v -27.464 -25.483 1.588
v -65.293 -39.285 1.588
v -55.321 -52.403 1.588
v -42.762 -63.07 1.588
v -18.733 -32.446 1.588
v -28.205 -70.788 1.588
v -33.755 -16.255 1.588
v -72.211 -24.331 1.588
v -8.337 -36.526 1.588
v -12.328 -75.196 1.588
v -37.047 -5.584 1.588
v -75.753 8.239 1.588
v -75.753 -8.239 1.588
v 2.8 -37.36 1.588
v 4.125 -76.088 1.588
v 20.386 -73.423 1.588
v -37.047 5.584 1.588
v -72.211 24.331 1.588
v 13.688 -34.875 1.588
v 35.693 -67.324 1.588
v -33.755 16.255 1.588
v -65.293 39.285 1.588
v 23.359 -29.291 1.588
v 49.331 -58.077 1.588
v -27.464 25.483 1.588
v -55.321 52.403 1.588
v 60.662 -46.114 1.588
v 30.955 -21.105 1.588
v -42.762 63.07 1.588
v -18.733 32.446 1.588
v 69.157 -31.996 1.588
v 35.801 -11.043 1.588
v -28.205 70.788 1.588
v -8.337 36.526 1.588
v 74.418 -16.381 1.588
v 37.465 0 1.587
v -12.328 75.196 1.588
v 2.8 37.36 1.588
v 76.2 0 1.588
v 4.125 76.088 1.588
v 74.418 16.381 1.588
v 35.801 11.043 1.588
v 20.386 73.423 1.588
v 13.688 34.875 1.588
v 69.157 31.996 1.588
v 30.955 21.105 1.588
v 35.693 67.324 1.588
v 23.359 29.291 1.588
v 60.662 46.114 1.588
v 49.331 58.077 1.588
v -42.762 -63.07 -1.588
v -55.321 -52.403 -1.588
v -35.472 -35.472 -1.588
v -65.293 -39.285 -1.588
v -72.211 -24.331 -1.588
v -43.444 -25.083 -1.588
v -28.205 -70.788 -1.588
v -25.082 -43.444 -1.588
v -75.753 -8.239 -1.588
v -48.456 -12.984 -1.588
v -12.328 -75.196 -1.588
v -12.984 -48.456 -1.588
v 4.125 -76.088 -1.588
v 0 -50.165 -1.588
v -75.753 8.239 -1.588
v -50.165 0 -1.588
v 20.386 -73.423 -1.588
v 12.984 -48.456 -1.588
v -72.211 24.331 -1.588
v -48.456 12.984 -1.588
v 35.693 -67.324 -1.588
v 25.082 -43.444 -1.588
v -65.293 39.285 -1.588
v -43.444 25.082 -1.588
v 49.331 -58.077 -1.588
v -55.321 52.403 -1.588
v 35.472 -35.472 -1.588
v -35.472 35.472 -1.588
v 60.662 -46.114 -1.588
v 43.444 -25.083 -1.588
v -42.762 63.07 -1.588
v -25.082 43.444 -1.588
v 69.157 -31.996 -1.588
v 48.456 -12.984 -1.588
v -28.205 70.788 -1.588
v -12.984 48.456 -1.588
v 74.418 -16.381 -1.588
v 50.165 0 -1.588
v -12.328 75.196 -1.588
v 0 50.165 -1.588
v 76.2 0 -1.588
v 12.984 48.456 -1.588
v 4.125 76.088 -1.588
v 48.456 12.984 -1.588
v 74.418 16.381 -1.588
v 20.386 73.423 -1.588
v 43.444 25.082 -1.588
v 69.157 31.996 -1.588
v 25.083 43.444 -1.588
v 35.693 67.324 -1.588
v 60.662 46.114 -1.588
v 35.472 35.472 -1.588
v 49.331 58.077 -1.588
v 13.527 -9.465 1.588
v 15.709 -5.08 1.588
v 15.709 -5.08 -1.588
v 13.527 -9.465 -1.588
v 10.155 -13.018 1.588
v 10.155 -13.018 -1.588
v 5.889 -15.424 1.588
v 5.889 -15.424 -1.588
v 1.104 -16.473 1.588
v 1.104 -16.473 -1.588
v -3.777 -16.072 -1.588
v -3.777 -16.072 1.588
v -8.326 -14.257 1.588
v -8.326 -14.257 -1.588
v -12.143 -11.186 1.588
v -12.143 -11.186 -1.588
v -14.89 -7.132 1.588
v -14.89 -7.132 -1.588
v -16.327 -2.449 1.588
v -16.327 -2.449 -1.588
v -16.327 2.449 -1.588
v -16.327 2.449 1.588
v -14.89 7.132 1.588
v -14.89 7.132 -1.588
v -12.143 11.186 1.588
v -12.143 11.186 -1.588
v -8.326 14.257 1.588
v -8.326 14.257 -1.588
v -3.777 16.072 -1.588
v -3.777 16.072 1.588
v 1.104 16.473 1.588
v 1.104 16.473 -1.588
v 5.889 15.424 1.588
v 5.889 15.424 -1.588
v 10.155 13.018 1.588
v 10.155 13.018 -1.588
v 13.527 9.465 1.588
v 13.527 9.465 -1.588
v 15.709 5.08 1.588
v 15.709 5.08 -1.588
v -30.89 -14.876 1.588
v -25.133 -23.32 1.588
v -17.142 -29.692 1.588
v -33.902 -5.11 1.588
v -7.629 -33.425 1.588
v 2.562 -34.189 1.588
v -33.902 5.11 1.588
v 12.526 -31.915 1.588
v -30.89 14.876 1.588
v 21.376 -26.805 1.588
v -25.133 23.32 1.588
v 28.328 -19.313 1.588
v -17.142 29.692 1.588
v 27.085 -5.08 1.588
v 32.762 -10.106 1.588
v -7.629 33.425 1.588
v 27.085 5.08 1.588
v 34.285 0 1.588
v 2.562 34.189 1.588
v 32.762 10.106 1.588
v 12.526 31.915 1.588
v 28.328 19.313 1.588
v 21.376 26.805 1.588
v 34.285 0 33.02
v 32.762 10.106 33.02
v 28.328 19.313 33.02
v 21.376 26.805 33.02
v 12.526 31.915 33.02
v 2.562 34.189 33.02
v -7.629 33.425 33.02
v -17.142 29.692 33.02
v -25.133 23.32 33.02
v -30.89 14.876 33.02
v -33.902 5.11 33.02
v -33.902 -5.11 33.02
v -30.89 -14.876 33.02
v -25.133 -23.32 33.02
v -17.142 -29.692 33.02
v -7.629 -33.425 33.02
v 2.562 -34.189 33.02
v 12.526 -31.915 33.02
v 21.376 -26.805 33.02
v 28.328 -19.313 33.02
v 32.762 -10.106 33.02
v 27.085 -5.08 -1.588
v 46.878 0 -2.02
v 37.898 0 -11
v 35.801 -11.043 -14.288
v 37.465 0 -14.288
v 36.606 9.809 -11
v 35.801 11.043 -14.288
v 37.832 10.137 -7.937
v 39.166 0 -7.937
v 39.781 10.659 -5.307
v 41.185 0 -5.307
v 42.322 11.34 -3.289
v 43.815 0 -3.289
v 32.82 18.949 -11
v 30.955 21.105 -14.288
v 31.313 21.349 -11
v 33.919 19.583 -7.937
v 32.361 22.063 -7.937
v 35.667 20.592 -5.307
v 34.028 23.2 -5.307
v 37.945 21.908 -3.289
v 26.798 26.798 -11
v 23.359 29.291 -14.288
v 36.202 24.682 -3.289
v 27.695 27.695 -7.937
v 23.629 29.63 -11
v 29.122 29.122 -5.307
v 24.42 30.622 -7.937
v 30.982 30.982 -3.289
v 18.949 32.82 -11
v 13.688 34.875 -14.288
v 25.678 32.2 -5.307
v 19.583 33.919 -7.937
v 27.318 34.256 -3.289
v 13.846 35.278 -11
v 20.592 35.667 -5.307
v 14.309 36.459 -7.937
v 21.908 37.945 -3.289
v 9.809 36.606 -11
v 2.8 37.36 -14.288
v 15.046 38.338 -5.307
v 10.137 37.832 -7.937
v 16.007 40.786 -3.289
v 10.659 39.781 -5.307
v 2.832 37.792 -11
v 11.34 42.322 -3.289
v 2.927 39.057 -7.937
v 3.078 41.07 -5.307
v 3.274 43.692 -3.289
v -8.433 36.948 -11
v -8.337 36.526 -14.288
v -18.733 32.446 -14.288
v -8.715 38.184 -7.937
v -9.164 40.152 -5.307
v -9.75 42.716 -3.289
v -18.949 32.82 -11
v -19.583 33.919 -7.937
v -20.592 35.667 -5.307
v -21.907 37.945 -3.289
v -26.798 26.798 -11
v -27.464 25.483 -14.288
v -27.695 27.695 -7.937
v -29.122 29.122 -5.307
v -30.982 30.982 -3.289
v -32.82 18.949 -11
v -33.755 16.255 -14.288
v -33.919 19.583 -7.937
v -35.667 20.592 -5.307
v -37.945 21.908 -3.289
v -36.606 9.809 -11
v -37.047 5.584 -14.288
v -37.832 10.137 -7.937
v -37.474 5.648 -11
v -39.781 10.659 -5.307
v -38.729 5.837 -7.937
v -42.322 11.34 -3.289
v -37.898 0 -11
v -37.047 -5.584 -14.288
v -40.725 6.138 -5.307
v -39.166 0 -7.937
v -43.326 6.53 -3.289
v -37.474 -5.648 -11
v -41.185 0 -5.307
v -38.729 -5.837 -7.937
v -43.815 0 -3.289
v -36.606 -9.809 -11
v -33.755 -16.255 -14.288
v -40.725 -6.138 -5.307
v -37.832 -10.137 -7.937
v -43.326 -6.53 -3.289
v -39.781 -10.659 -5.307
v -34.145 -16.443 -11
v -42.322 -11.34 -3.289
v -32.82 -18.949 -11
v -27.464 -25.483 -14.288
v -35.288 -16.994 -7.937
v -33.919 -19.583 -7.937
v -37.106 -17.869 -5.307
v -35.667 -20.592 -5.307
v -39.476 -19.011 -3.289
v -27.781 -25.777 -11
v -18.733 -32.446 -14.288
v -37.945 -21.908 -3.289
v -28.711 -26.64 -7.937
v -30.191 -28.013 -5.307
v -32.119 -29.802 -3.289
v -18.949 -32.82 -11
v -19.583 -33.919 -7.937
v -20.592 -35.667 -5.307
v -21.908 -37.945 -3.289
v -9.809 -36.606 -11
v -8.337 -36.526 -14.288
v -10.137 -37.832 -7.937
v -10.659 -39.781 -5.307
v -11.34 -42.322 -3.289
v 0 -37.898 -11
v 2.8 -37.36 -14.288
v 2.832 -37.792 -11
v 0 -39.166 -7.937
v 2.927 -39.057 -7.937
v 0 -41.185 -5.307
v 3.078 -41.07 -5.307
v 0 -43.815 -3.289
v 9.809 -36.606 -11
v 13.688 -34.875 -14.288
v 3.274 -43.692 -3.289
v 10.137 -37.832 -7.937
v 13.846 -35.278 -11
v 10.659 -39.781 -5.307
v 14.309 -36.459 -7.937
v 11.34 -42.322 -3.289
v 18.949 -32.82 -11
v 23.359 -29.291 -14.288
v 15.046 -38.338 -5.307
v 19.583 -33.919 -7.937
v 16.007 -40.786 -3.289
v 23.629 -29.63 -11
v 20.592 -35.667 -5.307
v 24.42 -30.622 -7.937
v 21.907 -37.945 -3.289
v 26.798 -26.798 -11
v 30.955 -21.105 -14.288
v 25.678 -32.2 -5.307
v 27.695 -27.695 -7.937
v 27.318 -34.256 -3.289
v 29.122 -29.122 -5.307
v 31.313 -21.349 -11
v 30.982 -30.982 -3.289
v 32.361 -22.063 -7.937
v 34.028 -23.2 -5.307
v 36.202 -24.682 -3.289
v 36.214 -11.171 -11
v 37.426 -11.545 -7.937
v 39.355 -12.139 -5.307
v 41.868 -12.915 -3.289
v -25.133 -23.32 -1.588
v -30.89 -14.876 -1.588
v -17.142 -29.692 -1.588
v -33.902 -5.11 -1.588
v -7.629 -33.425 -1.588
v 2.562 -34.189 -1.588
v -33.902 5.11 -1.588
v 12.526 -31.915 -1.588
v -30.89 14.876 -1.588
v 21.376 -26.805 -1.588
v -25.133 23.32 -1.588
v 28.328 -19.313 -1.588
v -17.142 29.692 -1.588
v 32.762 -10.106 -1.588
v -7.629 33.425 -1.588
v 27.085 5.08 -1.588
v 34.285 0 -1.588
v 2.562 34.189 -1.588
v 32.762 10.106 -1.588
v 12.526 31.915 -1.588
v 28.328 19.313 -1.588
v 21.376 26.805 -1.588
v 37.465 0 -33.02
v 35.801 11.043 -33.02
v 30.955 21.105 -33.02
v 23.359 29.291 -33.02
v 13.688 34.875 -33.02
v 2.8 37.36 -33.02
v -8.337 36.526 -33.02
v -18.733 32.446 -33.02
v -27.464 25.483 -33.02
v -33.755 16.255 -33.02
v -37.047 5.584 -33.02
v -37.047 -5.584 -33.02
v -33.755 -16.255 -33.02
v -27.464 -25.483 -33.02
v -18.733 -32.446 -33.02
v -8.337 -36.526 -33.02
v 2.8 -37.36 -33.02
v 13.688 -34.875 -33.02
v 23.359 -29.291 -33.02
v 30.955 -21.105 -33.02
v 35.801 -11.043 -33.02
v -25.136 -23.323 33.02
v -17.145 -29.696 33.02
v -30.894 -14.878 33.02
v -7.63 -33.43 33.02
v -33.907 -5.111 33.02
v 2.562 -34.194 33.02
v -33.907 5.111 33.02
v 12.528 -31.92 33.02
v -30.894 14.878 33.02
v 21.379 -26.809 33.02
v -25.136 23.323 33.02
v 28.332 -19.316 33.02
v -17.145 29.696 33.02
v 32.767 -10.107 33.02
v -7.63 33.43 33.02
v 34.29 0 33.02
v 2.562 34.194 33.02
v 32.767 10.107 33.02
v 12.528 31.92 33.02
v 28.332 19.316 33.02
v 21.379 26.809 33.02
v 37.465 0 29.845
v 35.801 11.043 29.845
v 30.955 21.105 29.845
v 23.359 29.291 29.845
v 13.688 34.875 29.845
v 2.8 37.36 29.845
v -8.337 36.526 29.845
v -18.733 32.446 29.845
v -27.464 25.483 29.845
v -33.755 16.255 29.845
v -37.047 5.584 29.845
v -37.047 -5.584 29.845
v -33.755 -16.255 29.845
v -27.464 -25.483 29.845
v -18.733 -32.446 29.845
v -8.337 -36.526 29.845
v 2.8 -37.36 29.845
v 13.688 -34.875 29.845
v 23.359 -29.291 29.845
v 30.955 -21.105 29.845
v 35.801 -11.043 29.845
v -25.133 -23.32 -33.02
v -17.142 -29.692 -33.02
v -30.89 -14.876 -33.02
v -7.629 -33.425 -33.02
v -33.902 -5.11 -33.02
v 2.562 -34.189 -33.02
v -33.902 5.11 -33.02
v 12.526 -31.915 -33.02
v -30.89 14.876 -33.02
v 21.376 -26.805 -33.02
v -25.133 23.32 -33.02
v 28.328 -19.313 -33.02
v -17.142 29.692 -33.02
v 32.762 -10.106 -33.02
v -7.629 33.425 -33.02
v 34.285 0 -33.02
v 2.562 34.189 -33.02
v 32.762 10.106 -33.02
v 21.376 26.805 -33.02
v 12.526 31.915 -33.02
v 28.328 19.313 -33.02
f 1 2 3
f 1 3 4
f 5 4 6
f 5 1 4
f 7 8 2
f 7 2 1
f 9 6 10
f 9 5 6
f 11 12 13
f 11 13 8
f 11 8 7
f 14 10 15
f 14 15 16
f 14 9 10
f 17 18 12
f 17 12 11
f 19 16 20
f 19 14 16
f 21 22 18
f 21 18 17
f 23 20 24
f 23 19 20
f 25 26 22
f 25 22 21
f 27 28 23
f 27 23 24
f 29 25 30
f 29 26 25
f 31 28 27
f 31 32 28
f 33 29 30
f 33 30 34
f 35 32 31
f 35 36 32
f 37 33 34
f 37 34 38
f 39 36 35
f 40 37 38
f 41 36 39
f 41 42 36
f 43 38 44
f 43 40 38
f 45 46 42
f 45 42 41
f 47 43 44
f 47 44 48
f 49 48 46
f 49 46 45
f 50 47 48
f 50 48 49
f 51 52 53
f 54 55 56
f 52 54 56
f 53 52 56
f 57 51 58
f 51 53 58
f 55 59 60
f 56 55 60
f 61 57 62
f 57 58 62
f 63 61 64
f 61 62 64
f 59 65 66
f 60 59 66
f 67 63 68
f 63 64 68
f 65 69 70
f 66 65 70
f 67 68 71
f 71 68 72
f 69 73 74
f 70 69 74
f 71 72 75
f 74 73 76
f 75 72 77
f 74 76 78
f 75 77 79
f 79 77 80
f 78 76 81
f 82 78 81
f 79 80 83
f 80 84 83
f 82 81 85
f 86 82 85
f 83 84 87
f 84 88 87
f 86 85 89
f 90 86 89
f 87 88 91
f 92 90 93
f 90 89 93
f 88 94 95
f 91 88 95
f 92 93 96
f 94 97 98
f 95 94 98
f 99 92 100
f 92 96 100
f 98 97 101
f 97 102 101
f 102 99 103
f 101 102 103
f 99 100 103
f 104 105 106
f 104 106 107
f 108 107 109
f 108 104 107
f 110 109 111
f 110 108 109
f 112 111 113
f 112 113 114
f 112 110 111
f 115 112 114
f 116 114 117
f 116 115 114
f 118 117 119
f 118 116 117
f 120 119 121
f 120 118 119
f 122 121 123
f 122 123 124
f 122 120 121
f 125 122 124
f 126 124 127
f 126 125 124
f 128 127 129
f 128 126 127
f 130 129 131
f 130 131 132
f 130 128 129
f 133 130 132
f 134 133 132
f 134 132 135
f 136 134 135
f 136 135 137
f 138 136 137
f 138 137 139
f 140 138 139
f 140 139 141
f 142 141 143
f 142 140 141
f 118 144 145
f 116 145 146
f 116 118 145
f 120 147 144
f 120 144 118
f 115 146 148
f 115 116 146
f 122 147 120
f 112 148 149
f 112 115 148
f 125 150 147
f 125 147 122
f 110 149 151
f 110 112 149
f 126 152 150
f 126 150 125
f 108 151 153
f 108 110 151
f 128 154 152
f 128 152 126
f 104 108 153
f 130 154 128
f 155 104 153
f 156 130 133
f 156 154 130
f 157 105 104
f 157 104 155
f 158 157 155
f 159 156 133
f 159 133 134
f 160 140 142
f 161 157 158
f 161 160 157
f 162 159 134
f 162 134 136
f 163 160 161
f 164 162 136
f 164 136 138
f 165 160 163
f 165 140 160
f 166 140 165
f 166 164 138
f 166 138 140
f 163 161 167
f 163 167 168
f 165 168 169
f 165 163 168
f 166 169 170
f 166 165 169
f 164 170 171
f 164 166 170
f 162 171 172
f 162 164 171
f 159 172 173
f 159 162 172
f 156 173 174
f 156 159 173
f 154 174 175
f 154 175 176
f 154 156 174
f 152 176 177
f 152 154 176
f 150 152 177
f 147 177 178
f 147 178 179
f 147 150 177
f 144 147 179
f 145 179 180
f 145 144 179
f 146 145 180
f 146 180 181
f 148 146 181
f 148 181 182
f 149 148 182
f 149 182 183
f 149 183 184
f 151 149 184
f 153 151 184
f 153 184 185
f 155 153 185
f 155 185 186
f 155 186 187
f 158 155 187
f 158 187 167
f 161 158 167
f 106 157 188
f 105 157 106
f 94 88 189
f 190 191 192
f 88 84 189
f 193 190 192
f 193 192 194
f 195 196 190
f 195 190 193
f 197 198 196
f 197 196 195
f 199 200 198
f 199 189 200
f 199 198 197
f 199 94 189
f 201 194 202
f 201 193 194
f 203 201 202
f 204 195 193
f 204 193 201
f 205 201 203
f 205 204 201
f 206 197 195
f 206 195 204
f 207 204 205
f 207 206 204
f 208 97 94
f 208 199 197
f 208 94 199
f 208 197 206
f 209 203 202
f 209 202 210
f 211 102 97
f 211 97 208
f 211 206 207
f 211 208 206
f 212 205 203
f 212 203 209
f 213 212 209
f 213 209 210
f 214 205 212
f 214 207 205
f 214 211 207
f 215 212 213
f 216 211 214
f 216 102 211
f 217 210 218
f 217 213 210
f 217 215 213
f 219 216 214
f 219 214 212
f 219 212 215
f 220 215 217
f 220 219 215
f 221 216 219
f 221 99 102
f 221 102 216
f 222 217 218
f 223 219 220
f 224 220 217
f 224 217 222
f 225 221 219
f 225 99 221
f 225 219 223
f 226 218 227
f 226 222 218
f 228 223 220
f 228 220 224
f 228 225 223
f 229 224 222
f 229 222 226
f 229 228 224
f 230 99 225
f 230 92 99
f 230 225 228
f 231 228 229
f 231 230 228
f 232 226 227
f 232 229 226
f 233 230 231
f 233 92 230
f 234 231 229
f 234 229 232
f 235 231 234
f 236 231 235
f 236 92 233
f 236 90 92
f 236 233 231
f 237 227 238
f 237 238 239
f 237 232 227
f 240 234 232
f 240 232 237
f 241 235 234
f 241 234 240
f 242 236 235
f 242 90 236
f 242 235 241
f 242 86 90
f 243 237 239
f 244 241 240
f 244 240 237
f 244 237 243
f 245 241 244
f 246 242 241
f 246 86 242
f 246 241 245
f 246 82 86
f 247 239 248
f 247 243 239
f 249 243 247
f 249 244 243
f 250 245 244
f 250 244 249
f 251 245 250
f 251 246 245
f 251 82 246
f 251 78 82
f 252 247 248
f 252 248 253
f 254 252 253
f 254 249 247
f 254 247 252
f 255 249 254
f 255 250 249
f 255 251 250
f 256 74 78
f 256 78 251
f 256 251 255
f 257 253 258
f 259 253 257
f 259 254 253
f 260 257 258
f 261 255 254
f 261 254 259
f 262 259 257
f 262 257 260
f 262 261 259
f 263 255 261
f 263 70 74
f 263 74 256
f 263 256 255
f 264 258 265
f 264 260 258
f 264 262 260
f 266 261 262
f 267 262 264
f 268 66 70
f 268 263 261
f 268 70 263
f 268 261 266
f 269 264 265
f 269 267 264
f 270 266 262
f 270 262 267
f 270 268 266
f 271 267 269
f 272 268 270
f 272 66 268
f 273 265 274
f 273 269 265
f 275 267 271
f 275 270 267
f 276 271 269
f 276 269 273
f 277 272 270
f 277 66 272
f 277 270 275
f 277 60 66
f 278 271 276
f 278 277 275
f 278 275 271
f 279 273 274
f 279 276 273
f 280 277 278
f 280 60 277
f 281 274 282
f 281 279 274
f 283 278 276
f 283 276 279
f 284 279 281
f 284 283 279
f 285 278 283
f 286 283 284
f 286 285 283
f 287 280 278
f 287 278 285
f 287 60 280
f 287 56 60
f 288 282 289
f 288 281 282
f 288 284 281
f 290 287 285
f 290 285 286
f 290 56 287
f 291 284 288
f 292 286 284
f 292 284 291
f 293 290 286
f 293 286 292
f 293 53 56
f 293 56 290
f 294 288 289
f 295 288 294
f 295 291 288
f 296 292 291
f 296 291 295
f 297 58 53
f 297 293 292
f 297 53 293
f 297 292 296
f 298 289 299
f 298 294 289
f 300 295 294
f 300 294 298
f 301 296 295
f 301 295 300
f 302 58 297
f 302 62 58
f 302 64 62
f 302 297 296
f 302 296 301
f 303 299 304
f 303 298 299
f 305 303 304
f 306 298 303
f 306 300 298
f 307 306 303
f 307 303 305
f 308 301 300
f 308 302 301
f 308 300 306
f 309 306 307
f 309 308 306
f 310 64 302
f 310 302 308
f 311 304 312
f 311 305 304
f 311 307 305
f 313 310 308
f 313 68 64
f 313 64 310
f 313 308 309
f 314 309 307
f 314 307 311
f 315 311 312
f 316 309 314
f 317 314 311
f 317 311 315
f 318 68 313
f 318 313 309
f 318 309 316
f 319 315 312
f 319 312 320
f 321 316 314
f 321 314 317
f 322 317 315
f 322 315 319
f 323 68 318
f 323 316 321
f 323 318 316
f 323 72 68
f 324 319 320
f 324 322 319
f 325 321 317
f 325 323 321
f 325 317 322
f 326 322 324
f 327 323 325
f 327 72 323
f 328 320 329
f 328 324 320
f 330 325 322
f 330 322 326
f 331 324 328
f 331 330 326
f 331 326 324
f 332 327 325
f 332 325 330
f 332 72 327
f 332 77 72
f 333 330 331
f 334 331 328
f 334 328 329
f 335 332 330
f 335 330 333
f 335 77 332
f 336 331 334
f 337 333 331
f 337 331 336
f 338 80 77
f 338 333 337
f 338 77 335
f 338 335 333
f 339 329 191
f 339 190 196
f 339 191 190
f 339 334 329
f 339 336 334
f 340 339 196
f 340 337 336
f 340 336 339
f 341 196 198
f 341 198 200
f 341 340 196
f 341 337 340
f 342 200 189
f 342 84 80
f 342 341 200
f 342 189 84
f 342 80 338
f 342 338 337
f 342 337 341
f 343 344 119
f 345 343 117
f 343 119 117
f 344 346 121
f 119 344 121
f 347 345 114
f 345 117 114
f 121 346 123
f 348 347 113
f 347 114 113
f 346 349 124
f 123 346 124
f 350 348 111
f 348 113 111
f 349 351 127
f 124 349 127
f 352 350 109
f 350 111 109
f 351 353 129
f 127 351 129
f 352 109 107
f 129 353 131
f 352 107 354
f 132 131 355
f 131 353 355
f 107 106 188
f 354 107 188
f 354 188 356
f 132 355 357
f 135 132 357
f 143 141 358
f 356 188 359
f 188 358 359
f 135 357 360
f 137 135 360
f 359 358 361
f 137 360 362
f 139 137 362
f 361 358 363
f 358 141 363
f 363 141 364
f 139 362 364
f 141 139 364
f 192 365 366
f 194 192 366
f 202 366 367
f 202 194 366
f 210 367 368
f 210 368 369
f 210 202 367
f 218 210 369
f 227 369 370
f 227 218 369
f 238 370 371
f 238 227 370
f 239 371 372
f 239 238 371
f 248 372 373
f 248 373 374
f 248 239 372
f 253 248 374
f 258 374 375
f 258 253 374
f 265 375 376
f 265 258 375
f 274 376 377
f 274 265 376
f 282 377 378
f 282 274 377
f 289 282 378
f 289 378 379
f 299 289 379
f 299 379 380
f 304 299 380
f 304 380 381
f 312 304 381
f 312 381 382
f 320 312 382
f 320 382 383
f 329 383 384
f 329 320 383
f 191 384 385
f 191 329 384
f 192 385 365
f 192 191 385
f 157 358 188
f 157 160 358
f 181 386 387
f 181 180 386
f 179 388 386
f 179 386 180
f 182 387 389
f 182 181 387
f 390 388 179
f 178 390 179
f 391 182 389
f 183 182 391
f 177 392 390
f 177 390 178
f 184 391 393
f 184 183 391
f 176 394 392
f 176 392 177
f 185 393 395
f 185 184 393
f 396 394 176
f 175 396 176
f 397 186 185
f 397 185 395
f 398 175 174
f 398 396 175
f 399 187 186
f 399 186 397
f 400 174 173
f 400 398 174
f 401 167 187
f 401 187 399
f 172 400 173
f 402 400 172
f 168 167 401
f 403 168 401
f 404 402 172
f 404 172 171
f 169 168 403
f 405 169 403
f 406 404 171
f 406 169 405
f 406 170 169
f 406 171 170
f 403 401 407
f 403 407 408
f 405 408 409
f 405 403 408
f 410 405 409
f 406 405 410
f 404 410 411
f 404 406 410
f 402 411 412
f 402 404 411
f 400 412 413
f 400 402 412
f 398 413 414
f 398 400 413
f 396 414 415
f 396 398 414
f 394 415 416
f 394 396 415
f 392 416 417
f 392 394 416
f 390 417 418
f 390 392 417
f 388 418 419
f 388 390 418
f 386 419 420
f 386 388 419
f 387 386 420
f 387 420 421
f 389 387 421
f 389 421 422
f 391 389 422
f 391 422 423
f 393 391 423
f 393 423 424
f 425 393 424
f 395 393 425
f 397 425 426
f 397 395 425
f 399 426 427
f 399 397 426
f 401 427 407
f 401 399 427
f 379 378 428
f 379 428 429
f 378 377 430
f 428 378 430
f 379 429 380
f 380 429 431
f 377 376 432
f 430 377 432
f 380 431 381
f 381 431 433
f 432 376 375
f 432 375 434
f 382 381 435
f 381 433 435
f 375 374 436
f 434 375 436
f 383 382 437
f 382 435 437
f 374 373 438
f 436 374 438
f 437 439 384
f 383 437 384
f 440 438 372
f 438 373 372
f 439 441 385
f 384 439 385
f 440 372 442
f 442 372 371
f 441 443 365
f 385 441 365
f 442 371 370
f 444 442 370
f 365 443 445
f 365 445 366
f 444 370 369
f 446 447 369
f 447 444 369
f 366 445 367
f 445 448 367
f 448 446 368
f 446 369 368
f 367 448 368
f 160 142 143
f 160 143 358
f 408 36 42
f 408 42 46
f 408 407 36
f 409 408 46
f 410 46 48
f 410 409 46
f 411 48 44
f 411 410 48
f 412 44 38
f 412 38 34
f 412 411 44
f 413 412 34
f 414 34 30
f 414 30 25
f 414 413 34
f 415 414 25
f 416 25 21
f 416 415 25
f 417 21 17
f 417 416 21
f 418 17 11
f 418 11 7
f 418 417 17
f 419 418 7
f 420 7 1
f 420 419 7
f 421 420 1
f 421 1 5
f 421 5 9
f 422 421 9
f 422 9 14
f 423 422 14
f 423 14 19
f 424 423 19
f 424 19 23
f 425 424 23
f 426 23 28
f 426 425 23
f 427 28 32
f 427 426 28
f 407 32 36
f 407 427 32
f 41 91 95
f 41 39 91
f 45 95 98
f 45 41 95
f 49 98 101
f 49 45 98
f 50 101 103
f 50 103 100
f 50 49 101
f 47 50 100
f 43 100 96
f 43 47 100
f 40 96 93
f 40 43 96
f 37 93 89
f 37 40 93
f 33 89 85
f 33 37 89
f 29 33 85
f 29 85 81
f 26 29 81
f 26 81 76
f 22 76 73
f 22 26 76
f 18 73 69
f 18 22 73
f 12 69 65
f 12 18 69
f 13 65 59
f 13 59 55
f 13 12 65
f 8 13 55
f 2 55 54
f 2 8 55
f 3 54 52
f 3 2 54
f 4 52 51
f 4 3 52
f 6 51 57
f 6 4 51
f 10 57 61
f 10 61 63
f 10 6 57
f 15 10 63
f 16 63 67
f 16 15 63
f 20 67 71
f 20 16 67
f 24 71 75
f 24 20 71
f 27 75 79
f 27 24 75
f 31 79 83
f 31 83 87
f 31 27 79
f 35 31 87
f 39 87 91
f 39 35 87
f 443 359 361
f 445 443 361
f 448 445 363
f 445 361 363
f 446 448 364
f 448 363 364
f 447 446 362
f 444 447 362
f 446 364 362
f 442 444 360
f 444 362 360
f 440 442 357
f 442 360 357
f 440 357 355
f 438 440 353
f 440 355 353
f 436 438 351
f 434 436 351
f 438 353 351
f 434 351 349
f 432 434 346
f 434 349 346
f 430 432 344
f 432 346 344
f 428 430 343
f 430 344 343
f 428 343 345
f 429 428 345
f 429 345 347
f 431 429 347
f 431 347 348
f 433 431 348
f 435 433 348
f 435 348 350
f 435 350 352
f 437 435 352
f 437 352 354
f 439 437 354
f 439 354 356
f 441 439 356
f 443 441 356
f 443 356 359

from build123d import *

# Parameters (mm, degrees)
F0_R          = 37.465
F0_R_2        = 34.28492
F1_DEPTH      = 33.02
F1_DEPTH_BACK = 33.02
F2_SIZE       = 3.175
F3_R          = 76.2
F4_DEPTH      = 1.5875
F4_DEPTH_BACK = 1.5875
F5_R          = 12.7


with BuildPart() as f1:
    # F0 (on Top) → F1 (new body, two sides)
    with BuildSketch(Plane.XY) as f1_sk:
        Circle(F0_R)
        Circle(F0_R_2, mode=Mode.SUBTRACT)
    extrude(amount=F1_DEPTH)
    extrude(f1_sk.sketch, amount=-F1_DEPTH_BACK)

    # F2
    f2_edges = [f1.edges().sort_by_distance(p)[0] for p in [
        (-37.465, 0, 33.02),
    ]]
    chamfer(f2_edges, length=F2_SIZE)

    # F3 (on Top) → F4 (join, two sides)
    with BuildSketch(Plane.XY) as f4_sk:
        Circle(F3_R)
        with BuildLine():
            ThreePointArc((15.7090324336, -5.08), (-16.51, 0), (15.7090324336, 5.08))
            Line((15.7090324336, 5.08), (27.08475078, 5.08))
            Line((27.08475078, 5.08), (27.08475078, -5.08))
            Line((27.08475078, -5.08), (15.7090324336, -5.08))
        make_face(mode=Mode.SUBTRACT)
    extrude(amount=F4_DEPTH)
    extrude(f4_sk.sketch, amount=-F4_DEPTH_BACK)

    # F5
    f5_edges = [f1.edges().sort_by_distance(p)[0] for p in [
        (-37.465, 0, -1.5875),
    ]]
    fillet(f5_edges, radius=F5_R)


solid = f1.part
